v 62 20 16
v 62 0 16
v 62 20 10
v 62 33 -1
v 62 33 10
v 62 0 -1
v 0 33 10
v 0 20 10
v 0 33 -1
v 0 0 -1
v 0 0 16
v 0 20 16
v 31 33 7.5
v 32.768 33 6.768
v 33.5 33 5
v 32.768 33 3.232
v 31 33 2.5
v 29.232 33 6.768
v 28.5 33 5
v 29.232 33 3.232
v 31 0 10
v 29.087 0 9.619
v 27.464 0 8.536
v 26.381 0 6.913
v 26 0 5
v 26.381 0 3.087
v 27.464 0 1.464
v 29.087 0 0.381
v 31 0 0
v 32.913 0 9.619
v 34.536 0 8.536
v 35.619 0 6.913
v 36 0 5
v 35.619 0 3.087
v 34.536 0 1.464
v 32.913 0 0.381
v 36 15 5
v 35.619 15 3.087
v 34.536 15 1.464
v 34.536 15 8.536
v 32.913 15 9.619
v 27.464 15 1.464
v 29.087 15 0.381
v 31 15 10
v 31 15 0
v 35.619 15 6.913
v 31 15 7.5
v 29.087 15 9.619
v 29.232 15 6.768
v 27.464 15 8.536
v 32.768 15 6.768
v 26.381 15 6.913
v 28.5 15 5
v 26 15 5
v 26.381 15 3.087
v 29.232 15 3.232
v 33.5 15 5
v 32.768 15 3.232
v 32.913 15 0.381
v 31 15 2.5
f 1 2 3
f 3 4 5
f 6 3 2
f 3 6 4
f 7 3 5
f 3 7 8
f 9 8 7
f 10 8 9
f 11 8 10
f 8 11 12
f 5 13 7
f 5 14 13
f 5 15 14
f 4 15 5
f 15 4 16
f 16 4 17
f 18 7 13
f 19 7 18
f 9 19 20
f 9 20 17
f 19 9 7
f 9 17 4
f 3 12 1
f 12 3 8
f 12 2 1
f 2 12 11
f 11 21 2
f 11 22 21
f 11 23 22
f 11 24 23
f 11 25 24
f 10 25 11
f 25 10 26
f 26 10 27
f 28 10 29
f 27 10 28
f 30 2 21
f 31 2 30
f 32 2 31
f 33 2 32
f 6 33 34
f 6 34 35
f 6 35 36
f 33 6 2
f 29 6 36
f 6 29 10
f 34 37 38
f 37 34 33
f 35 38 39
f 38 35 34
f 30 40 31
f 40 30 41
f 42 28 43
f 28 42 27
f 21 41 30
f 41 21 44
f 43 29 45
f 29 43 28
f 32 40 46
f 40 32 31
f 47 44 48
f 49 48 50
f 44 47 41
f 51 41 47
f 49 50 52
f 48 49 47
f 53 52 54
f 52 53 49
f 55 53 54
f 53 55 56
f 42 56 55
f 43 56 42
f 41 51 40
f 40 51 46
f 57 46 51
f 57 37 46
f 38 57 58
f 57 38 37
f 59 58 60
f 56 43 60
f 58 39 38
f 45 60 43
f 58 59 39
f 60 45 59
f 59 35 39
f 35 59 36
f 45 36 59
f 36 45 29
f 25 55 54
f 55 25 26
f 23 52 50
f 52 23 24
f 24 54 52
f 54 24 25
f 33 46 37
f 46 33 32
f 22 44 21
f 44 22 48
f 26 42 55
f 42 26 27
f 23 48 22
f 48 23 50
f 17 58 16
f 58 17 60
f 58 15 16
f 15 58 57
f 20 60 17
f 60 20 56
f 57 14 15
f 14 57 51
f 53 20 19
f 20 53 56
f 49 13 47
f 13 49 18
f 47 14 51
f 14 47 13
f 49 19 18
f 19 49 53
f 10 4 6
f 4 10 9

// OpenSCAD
//This is how far the bracket will extend into the shelf
hookthick = 20;
length = 62*1;

width = 33*1;

heightlow = 10*1;

heighthight = 16*1;
//This is how thick the wood is that the bracet will grab on to in mm
hookshelf = 13;
difference(){
    
    union(){
        color("red")   translate([0,hookthick,0] )     cube([length, hookshelf, heightlow]);
    
        color("blue")   cube([length, hookthick, heighthight]);
    }
       color ("red") translate([length/2, 0, heightlow/2]) rotate([270,0,0]) cylinder(hookthick*.75,5,5);
    translate([length/2, 0, heightlow/2]) rotate([270,0,0]) cylinder(hookthick + heighthight,2.5,2.5);

} 
translate([length, 0,0]) rotate([0,180,0]) cube([length, hookshelf + hookthick , 1]);
//text("woo") center = true;

//difference()  {cube(12, center=true); sphere(8);}
